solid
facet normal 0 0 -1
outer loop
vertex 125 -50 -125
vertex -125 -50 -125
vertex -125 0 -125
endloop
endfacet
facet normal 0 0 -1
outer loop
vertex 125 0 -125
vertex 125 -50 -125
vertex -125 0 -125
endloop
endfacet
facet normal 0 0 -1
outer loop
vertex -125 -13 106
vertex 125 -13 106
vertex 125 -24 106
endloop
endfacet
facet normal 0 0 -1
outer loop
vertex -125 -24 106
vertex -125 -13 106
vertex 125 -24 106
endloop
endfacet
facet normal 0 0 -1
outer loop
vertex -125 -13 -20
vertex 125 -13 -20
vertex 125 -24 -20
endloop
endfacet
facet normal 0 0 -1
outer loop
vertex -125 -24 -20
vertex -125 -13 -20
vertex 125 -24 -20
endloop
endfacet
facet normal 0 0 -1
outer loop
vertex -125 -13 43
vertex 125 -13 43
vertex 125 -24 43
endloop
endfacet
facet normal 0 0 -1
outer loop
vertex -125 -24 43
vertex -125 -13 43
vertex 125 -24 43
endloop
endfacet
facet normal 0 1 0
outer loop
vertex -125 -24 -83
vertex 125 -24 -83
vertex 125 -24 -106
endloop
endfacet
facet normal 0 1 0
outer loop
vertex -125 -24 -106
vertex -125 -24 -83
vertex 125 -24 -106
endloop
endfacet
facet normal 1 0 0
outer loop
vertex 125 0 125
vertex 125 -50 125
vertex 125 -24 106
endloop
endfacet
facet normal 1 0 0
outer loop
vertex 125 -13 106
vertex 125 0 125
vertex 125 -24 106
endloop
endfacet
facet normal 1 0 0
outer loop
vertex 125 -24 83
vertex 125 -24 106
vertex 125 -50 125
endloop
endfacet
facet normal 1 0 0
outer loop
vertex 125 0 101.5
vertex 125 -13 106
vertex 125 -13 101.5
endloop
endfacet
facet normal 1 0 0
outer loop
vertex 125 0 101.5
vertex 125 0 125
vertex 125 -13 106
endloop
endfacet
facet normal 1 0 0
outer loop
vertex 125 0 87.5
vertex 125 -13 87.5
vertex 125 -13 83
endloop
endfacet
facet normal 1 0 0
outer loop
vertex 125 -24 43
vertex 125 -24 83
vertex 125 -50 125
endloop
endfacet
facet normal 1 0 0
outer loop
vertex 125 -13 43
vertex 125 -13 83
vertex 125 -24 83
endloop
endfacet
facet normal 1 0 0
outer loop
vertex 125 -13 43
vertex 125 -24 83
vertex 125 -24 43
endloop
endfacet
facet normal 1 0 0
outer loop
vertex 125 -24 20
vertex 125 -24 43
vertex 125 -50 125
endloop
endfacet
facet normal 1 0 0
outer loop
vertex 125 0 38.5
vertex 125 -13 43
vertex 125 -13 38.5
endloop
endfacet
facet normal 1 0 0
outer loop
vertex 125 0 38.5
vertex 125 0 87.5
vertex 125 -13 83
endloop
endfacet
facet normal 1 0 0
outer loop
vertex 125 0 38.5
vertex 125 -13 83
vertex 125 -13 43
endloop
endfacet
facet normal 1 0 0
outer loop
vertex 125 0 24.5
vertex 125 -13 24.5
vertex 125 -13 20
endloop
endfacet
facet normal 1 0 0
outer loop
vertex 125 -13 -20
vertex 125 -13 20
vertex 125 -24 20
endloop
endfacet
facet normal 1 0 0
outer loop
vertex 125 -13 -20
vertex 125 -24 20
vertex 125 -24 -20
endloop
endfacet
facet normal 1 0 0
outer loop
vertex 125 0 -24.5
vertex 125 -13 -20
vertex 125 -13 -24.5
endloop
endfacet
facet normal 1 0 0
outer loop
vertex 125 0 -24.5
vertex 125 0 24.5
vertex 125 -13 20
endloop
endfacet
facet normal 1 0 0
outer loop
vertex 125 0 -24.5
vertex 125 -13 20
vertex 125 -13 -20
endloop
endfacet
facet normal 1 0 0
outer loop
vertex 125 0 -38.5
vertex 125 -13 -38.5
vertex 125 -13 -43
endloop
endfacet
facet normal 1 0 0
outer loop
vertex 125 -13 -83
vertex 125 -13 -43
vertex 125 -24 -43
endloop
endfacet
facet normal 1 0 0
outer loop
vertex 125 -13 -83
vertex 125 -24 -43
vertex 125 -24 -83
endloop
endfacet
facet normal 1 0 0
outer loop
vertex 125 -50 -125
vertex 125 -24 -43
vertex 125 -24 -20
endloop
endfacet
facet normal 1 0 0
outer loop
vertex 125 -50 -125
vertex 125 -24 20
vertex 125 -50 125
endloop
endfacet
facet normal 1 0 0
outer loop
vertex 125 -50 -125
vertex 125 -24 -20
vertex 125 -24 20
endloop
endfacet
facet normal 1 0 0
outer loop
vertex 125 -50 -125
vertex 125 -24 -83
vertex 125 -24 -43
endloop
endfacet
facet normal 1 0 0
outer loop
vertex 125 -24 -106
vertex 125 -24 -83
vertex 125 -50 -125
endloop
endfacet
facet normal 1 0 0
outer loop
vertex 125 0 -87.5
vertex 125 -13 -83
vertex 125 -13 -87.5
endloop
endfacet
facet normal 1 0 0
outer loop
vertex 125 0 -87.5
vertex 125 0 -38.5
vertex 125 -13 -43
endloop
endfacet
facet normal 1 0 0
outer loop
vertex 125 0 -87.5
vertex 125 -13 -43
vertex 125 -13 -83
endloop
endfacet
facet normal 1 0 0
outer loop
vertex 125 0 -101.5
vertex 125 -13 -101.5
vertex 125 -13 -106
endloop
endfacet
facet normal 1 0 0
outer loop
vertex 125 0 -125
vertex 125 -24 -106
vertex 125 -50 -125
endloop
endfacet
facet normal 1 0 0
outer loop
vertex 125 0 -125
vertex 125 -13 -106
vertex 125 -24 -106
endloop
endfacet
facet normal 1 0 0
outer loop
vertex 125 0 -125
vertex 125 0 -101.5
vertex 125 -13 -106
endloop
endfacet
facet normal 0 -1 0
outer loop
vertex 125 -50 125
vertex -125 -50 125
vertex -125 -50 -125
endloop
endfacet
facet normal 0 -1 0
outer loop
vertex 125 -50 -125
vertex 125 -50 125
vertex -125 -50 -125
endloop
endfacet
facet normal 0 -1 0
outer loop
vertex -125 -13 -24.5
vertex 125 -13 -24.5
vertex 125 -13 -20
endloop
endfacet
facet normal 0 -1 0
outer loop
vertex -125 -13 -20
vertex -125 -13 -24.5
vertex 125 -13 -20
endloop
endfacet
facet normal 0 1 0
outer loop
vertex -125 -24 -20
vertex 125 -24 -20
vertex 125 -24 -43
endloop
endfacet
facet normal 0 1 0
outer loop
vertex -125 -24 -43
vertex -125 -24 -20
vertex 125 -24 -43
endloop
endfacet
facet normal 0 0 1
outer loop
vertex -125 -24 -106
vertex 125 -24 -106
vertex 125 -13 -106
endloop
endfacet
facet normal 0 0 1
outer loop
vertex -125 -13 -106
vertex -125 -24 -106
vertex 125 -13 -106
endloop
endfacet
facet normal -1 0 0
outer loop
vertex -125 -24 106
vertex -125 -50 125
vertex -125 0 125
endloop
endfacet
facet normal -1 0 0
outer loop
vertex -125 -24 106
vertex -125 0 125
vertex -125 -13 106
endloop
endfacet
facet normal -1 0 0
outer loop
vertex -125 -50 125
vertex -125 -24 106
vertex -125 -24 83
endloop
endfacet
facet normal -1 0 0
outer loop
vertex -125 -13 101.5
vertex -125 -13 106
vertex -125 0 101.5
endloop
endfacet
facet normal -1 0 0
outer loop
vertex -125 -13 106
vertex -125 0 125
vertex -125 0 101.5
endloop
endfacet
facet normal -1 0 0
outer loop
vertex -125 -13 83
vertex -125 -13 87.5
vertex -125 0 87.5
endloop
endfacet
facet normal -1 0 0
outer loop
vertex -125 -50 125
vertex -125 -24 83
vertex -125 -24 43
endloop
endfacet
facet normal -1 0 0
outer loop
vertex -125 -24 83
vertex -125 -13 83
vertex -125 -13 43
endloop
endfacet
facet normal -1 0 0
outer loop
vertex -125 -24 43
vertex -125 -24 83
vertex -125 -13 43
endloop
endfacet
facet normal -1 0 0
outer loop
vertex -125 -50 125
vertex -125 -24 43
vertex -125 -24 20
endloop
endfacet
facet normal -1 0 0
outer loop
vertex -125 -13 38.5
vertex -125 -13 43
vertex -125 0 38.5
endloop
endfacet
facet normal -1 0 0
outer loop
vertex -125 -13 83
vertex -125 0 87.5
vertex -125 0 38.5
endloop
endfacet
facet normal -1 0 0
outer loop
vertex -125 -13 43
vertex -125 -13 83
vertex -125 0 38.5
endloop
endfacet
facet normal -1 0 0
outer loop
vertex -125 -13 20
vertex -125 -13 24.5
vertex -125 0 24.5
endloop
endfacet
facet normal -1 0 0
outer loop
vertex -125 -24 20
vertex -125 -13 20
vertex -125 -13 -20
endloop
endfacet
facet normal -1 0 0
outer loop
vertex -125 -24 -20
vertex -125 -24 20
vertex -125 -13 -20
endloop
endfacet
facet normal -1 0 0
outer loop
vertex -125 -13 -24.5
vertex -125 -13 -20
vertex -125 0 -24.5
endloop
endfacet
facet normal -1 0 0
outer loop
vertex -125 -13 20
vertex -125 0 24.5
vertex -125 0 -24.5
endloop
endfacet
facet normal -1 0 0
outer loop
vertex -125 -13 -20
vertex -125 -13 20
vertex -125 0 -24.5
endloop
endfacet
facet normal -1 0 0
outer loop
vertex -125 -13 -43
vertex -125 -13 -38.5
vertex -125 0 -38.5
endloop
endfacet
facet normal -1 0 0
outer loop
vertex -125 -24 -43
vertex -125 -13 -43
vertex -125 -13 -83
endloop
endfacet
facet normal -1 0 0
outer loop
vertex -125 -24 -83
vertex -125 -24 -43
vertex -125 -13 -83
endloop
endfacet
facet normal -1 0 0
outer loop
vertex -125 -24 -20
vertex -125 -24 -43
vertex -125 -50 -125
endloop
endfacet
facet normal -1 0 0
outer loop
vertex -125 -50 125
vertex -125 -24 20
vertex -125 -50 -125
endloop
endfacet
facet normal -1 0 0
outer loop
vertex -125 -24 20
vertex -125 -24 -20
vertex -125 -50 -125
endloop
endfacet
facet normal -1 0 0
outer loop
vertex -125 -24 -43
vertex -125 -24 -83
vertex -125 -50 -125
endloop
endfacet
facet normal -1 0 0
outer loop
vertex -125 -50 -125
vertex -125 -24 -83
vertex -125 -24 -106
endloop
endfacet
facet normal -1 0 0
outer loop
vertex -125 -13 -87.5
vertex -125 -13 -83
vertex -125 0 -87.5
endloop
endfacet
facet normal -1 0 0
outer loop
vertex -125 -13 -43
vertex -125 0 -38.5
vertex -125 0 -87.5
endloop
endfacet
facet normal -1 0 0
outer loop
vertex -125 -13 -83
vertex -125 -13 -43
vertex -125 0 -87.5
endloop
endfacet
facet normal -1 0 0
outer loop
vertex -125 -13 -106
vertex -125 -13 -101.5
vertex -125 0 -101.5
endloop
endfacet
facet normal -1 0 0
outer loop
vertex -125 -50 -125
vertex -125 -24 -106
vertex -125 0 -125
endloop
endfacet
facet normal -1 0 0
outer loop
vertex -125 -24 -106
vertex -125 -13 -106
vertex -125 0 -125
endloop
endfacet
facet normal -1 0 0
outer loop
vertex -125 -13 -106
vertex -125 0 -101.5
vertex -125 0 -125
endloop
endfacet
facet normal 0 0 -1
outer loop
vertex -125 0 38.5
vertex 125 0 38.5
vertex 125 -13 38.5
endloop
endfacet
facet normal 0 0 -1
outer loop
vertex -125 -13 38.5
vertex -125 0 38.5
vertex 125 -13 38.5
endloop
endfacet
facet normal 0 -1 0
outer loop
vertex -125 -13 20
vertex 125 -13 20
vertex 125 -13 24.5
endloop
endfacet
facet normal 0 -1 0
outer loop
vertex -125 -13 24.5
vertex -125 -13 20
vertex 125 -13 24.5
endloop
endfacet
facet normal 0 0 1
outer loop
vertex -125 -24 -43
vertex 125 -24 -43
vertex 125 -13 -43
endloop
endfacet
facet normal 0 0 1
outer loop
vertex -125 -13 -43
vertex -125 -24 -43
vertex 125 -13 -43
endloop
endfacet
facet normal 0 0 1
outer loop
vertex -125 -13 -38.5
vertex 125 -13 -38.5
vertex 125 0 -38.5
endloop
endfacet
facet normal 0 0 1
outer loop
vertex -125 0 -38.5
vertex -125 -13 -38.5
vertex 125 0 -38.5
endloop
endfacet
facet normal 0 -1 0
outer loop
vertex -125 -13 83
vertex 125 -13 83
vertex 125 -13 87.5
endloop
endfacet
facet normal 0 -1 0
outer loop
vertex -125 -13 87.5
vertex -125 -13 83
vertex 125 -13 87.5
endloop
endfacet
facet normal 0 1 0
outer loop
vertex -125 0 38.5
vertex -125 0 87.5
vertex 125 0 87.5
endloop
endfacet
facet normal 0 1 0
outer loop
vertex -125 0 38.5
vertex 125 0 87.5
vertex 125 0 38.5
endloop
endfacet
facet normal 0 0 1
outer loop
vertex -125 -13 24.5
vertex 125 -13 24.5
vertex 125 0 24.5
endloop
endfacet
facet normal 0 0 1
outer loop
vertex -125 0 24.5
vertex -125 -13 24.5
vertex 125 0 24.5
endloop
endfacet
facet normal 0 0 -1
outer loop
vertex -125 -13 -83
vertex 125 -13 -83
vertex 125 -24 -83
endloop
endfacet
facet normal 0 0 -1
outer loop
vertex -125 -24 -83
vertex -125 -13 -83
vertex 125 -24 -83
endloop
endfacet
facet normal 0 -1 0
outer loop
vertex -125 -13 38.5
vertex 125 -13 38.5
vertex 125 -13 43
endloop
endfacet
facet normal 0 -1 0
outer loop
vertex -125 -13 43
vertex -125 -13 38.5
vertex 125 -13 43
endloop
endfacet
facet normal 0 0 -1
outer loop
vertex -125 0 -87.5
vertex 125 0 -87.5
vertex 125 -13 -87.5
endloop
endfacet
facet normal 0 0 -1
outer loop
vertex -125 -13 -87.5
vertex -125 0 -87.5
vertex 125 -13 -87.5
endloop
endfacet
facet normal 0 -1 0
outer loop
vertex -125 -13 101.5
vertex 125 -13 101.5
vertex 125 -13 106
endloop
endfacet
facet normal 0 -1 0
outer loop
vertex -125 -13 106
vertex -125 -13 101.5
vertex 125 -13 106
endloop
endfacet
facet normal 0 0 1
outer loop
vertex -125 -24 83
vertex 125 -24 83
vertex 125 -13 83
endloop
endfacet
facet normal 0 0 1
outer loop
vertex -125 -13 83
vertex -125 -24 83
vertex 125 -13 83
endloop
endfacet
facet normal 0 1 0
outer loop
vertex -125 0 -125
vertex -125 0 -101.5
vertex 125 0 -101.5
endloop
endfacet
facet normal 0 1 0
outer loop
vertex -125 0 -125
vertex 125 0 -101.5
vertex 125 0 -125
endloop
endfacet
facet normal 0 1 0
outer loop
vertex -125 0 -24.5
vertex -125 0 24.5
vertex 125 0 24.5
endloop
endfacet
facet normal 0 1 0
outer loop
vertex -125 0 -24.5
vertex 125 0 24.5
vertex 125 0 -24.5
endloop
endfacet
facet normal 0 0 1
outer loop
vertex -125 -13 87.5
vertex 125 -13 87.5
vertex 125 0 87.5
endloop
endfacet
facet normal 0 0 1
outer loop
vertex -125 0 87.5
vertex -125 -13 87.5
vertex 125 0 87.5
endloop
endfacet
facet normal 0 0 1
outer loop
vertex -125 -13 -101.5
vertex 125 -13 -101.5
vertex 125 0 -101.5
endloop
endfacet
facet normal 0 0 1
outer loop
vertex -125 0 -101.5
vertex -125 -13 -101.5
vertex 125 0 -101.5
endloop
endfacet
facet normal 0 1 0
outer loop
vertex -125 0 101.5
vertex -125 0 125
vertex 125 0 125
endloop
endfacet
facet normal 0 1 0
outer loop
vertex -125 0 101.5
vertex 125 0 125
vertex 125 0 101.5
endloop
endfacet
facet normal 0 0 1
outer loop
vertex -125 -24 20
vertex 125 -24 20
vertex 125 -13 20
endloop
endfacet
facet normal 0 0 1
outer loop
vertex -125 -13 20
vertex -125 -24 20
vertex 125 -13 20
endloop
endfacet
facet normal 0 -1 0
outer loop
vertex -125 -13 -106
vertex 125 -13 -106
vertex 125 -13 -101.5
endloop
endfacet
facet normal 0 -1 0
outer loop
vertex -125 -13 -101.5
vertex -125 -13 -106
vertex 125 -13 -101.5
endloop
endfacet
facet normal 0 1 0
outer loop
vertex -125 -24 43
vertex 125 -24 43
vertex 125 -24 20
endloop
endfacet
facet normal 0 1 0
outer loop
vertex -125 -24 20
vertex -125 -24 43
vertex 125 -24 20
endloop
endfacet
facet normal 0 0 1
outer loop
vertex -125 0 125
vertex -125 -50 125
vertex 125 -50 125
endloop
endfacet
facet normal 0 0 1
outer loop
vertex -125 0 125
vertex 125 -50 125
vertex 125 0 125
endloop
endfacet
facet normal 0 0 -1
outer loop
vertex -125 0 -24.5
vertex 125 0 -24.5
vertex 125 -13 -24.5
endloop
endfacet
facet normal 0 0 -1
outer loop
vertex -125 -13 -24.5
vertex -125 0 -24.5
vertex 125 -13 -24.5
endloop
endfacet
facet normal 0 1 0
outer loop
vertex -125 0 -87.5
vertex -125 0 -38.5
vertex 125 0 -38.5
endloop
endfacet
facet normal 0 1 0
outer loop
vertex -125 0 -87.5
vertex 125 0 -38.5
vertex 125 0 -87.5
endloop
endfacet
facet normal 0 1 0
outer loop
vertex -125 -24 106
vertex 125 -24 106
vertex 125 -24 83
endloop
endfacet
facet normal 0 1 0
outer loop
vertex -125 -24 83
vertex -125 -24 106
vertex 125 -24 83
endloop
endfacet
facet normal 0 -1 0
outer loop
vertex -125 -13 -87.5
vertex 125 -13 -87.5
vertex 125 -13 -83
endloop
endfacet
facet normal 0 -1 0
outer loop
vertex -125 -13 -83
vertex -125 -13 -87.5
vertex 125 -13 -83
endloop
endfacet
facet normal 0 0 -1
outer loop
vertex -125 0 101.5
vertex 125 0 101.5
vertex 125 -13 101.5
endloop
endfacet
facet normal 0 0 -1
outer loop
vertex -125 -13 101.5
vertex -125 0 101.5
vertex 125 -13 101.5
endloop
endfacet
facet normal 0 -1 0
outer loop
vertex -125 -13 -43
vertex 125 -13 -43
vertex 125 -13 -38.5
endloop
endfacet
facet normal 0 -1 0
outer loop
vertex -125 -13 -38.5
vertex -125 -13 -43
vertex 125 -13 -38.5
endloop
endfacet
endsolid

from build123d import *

# Parameters (mm, degrees)
SALIENTE_EXTRUIR1_DEPTH      = 125
SALIENTE_EXTRUIR1_DEPTH_BACK = 125
CROQUIS1_W                   = 250
CROQUIS1_H                   = 50
CORTAR_EXTRUIR1_DEPTH        = 284.94541729


with BuildPart() as part:
    # Croquis1 → Saliente-Extruir1 (new, two sides: drawn at the far end of the back side and taken through both)
    with BuildSketch(Plane(origin=(0, 0, 0), x_dir=(0, 0, -1), z_dir=(1, 0, 0)).offset(-SALIENTE_EXTRUIR1_DEPTH_BACK)):
        with Locations((0, -25)):
            Rectangle(CROQUIS1_W, CROQUIS1_H)
    extrude(amount=SALIENTE_EXTRUIR1_DEPTH + SALIENTE_EXTRUIR1_DEPTH_BACK)

    # Croquis2 → Cortar-Extruir1 (cut, through all)
    with BuildSketch(Plane(origin=(125, 0, 0), x_dir=(0, 0, -1), z_dir=(1, 0, 0))):
        Polygon((-101.5, 0), (-101.5, -13), (-106, -13), (-106, -24), (-83, -24), (-83, -13), (-87.5, -13), (-87.5, 0), align=None)
        Polygon((-24.5, 0), (-38.5, 0), (-38.5, -13), (-43, -13), (-43, -24), (-20, -24), (-20, -13), (-24.5, -13), align=None)
        Polygon((38.5, 0), (24.5, 0), (24.5, -13), (20, -13), (20, -24), (43, -24), (43, -13), (38.5, -13), align=None)
        Polygon((101.5, 0), (87.5, 0), (87.5, -13), (83, -13), (83, -24), (106, -24), (106, -13), (101.5, -13), align=None)
    extrude(amount=-CORTAR_EXTRUIR1_DEPTH, mode=Mode.SUBTRACT)


solid = part.part
